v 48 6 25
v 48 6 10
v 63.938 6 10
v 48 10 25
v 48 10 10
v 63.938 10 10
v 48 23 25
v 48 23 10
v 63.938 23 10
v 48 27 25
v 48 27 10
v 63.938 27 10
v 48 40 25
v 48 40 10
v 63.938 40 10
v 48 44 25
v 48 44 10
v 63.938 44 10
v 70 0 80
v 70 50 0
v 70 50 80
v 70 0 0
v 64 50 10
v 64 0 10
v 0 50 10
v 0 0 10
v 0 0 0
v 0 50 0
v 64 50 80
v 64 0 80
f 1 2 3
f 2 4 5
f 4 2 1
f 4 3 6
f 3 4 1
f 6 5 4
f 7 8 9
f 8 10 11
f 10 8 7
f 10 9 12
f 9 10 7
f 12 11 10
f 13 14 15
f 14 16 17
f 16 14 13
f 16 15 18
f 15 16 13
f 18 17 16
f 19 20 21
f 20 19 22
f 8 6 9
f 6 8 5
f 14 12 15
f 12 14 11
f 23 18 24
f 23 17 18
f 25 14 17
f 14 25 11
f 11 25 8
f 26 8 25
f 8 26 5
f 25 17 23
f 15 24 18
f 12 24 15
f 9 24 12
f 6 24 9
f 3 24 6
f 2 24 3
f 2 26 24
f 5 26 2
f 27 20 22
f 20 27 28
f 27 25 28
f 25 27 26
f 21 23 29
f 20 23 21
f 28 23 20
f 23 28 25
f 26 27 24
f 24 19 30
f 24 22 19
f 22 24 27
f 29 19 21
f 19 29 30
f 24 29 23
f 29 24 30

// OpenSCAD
$fn = 32;

// ----------------------------------------------------------------------
// Rib bracket: 3-gusset L bracket
// ----------------------------------------------------------------------

// --- parameters (mm) ---
base_l = 70;              // foot length, X
base_w = 50;              // foot width, Y
base_t = 10;              // foot thickness
plate_t = 6;              // upright plate thickness
plate_h = 80;             // overall height
gus_l = 16;               // gusset leg along the foot
gus_h = 16;               // gusset height
gus_t = 4;                // gusset thickness
gus_edge = 6;             // gusset margin from the foot edge
n_gus = 3;                // gusset count
fit_tol = 0.05;           // tolerance for press fits, mm
free_tol = 0.2;           // tolerance for clearance fits, mm

gus_pitch = (base_w - 2 * gus_edge - gus_t) / (n_gus - 1);  // gusset pitch

union() {
  cube([base_l, base_w, base_t]);
  translate([base_l - plate_t, 0, base_t - 1])
    cube([plate_t, base_w, plate_h - base_t + 1]);
  for (i = [0 : n_gus - 1])
    translate([base_l - plate_t - gus_l, gus_edge + i * gus_pitch, base_t - 1])
      rotate([-90, 0, 0])
        linear_extrude(height = gus_t)
          polygon(points = [[0, 0], [gus_l + 1, 0], [0, -gus_h]]);
}
